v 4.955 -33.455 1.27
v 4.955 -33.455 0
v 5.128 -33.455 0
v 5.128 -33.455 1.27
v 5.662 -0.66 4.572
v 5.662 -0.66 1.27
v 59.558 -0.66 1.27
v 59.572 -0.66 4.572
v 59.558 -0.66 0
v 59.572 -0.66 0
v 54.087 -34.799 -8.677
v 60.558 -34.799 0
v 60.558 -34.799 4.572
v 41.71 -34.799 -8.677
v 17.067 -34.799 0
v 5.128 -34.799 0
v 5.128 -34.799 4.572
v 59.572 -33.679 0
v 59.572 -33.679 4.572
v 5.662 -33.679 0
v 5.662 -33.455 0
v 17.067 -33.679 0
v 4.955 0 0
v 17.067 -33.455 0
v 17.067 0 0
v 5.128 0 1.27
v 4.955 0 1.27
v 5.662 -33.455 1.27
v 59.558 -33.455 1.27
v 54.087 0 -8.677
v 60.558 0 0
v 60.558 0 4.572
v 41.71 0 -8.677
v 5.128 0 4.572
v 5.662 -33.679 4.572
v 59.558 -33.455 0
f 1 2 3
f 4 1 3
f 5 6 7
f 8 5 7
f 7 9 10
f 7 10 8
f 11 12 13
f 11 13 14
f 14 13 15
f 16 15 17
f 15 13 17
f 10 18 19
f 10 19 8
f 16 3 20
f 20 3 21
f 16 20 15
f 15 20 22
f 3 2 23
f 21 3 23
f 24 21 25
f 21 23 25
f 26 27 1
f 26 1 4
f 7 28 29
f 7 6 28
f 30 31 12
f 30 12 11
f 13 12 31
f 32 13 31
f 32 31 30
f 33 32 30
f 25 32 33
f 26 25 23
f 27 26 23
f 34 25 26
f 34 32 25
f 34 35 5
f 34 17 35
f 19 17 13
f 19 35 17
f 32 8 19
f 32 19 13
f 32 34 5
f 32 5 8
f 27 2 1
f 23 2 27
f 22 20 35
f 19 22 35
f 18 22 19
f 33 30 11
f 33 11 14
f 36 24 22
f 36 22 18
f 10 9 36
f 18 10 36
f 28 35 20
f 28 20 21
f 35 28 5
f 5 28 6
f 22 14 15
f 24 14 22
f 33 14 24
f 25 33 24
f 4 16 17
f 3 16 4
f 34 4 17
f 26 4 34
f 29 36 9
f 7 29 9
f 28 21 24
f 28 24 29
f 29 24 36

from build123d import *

# Parameters (mm, degrees)
F0_W     = 55.4297519848
F0_H     = 34.7989164293
F0_W_2   = 53.9102558978
F0_H_2   = 33.0191702233
F1_DEPTH = 4.572
F2_W     = 54.6025102958
F2_H     = 33.4553048015
F3_DEPTH = 1.27
F5_DEPTH = 34.7989164293
F6_W     = 13.8362795115
F6_H     = 32.7950716601
F7_DEPTH = 8.382


with BuildPart() as f1:
    # F0 (on Top) → F1 (new body)
    with BuildSketch(Plane.XY):
        with Locations((32.8427054919, -17.3994582146)):
            Rectangle(F0_W, F0_H)
        with Locations((32.6169689652, -17.169818253)):
            Rectangle(F0_W_2, F0_H_2, mode=Mode.SUBTRACT)
    extrude(amount=F1_DEPTH)

    # F2 (on Top) → F3 (join)
    with BuildSketch(Plane.XY):
        with Locations((32.2563764639, -16.7276524007)):
            Rectangle(F2_W, F2_H)
    extrude(amount=F3_DEPTH)

    # F4 (on face) → F5 (join, through all)
    with BuildSketch(Plane(origin=(0, 0, 0), x_dir=(-1, 0, 0), z_dir=(0, 1, 0))):
        Polygon((-41.7104549706, 0), (-54.087433964, 0), (-60.5575814843, 0), (-54.087433964, -8.6766919121), (-41.7104549706, -8.6766919121), (-17.0669779181, 0), align=None)
    extrude(amount=-F5_DEPTH)

    # F6 (on face) → F7 (join)
    with BuildSketch(Plane.XY.offset(1.27)):
        with Locations((46.8185357749, -17.0577689714)):
            Rectangle(F6_W, F6_H)
    extrude(amount=-F7_DEPTH)


solid = f1.part
